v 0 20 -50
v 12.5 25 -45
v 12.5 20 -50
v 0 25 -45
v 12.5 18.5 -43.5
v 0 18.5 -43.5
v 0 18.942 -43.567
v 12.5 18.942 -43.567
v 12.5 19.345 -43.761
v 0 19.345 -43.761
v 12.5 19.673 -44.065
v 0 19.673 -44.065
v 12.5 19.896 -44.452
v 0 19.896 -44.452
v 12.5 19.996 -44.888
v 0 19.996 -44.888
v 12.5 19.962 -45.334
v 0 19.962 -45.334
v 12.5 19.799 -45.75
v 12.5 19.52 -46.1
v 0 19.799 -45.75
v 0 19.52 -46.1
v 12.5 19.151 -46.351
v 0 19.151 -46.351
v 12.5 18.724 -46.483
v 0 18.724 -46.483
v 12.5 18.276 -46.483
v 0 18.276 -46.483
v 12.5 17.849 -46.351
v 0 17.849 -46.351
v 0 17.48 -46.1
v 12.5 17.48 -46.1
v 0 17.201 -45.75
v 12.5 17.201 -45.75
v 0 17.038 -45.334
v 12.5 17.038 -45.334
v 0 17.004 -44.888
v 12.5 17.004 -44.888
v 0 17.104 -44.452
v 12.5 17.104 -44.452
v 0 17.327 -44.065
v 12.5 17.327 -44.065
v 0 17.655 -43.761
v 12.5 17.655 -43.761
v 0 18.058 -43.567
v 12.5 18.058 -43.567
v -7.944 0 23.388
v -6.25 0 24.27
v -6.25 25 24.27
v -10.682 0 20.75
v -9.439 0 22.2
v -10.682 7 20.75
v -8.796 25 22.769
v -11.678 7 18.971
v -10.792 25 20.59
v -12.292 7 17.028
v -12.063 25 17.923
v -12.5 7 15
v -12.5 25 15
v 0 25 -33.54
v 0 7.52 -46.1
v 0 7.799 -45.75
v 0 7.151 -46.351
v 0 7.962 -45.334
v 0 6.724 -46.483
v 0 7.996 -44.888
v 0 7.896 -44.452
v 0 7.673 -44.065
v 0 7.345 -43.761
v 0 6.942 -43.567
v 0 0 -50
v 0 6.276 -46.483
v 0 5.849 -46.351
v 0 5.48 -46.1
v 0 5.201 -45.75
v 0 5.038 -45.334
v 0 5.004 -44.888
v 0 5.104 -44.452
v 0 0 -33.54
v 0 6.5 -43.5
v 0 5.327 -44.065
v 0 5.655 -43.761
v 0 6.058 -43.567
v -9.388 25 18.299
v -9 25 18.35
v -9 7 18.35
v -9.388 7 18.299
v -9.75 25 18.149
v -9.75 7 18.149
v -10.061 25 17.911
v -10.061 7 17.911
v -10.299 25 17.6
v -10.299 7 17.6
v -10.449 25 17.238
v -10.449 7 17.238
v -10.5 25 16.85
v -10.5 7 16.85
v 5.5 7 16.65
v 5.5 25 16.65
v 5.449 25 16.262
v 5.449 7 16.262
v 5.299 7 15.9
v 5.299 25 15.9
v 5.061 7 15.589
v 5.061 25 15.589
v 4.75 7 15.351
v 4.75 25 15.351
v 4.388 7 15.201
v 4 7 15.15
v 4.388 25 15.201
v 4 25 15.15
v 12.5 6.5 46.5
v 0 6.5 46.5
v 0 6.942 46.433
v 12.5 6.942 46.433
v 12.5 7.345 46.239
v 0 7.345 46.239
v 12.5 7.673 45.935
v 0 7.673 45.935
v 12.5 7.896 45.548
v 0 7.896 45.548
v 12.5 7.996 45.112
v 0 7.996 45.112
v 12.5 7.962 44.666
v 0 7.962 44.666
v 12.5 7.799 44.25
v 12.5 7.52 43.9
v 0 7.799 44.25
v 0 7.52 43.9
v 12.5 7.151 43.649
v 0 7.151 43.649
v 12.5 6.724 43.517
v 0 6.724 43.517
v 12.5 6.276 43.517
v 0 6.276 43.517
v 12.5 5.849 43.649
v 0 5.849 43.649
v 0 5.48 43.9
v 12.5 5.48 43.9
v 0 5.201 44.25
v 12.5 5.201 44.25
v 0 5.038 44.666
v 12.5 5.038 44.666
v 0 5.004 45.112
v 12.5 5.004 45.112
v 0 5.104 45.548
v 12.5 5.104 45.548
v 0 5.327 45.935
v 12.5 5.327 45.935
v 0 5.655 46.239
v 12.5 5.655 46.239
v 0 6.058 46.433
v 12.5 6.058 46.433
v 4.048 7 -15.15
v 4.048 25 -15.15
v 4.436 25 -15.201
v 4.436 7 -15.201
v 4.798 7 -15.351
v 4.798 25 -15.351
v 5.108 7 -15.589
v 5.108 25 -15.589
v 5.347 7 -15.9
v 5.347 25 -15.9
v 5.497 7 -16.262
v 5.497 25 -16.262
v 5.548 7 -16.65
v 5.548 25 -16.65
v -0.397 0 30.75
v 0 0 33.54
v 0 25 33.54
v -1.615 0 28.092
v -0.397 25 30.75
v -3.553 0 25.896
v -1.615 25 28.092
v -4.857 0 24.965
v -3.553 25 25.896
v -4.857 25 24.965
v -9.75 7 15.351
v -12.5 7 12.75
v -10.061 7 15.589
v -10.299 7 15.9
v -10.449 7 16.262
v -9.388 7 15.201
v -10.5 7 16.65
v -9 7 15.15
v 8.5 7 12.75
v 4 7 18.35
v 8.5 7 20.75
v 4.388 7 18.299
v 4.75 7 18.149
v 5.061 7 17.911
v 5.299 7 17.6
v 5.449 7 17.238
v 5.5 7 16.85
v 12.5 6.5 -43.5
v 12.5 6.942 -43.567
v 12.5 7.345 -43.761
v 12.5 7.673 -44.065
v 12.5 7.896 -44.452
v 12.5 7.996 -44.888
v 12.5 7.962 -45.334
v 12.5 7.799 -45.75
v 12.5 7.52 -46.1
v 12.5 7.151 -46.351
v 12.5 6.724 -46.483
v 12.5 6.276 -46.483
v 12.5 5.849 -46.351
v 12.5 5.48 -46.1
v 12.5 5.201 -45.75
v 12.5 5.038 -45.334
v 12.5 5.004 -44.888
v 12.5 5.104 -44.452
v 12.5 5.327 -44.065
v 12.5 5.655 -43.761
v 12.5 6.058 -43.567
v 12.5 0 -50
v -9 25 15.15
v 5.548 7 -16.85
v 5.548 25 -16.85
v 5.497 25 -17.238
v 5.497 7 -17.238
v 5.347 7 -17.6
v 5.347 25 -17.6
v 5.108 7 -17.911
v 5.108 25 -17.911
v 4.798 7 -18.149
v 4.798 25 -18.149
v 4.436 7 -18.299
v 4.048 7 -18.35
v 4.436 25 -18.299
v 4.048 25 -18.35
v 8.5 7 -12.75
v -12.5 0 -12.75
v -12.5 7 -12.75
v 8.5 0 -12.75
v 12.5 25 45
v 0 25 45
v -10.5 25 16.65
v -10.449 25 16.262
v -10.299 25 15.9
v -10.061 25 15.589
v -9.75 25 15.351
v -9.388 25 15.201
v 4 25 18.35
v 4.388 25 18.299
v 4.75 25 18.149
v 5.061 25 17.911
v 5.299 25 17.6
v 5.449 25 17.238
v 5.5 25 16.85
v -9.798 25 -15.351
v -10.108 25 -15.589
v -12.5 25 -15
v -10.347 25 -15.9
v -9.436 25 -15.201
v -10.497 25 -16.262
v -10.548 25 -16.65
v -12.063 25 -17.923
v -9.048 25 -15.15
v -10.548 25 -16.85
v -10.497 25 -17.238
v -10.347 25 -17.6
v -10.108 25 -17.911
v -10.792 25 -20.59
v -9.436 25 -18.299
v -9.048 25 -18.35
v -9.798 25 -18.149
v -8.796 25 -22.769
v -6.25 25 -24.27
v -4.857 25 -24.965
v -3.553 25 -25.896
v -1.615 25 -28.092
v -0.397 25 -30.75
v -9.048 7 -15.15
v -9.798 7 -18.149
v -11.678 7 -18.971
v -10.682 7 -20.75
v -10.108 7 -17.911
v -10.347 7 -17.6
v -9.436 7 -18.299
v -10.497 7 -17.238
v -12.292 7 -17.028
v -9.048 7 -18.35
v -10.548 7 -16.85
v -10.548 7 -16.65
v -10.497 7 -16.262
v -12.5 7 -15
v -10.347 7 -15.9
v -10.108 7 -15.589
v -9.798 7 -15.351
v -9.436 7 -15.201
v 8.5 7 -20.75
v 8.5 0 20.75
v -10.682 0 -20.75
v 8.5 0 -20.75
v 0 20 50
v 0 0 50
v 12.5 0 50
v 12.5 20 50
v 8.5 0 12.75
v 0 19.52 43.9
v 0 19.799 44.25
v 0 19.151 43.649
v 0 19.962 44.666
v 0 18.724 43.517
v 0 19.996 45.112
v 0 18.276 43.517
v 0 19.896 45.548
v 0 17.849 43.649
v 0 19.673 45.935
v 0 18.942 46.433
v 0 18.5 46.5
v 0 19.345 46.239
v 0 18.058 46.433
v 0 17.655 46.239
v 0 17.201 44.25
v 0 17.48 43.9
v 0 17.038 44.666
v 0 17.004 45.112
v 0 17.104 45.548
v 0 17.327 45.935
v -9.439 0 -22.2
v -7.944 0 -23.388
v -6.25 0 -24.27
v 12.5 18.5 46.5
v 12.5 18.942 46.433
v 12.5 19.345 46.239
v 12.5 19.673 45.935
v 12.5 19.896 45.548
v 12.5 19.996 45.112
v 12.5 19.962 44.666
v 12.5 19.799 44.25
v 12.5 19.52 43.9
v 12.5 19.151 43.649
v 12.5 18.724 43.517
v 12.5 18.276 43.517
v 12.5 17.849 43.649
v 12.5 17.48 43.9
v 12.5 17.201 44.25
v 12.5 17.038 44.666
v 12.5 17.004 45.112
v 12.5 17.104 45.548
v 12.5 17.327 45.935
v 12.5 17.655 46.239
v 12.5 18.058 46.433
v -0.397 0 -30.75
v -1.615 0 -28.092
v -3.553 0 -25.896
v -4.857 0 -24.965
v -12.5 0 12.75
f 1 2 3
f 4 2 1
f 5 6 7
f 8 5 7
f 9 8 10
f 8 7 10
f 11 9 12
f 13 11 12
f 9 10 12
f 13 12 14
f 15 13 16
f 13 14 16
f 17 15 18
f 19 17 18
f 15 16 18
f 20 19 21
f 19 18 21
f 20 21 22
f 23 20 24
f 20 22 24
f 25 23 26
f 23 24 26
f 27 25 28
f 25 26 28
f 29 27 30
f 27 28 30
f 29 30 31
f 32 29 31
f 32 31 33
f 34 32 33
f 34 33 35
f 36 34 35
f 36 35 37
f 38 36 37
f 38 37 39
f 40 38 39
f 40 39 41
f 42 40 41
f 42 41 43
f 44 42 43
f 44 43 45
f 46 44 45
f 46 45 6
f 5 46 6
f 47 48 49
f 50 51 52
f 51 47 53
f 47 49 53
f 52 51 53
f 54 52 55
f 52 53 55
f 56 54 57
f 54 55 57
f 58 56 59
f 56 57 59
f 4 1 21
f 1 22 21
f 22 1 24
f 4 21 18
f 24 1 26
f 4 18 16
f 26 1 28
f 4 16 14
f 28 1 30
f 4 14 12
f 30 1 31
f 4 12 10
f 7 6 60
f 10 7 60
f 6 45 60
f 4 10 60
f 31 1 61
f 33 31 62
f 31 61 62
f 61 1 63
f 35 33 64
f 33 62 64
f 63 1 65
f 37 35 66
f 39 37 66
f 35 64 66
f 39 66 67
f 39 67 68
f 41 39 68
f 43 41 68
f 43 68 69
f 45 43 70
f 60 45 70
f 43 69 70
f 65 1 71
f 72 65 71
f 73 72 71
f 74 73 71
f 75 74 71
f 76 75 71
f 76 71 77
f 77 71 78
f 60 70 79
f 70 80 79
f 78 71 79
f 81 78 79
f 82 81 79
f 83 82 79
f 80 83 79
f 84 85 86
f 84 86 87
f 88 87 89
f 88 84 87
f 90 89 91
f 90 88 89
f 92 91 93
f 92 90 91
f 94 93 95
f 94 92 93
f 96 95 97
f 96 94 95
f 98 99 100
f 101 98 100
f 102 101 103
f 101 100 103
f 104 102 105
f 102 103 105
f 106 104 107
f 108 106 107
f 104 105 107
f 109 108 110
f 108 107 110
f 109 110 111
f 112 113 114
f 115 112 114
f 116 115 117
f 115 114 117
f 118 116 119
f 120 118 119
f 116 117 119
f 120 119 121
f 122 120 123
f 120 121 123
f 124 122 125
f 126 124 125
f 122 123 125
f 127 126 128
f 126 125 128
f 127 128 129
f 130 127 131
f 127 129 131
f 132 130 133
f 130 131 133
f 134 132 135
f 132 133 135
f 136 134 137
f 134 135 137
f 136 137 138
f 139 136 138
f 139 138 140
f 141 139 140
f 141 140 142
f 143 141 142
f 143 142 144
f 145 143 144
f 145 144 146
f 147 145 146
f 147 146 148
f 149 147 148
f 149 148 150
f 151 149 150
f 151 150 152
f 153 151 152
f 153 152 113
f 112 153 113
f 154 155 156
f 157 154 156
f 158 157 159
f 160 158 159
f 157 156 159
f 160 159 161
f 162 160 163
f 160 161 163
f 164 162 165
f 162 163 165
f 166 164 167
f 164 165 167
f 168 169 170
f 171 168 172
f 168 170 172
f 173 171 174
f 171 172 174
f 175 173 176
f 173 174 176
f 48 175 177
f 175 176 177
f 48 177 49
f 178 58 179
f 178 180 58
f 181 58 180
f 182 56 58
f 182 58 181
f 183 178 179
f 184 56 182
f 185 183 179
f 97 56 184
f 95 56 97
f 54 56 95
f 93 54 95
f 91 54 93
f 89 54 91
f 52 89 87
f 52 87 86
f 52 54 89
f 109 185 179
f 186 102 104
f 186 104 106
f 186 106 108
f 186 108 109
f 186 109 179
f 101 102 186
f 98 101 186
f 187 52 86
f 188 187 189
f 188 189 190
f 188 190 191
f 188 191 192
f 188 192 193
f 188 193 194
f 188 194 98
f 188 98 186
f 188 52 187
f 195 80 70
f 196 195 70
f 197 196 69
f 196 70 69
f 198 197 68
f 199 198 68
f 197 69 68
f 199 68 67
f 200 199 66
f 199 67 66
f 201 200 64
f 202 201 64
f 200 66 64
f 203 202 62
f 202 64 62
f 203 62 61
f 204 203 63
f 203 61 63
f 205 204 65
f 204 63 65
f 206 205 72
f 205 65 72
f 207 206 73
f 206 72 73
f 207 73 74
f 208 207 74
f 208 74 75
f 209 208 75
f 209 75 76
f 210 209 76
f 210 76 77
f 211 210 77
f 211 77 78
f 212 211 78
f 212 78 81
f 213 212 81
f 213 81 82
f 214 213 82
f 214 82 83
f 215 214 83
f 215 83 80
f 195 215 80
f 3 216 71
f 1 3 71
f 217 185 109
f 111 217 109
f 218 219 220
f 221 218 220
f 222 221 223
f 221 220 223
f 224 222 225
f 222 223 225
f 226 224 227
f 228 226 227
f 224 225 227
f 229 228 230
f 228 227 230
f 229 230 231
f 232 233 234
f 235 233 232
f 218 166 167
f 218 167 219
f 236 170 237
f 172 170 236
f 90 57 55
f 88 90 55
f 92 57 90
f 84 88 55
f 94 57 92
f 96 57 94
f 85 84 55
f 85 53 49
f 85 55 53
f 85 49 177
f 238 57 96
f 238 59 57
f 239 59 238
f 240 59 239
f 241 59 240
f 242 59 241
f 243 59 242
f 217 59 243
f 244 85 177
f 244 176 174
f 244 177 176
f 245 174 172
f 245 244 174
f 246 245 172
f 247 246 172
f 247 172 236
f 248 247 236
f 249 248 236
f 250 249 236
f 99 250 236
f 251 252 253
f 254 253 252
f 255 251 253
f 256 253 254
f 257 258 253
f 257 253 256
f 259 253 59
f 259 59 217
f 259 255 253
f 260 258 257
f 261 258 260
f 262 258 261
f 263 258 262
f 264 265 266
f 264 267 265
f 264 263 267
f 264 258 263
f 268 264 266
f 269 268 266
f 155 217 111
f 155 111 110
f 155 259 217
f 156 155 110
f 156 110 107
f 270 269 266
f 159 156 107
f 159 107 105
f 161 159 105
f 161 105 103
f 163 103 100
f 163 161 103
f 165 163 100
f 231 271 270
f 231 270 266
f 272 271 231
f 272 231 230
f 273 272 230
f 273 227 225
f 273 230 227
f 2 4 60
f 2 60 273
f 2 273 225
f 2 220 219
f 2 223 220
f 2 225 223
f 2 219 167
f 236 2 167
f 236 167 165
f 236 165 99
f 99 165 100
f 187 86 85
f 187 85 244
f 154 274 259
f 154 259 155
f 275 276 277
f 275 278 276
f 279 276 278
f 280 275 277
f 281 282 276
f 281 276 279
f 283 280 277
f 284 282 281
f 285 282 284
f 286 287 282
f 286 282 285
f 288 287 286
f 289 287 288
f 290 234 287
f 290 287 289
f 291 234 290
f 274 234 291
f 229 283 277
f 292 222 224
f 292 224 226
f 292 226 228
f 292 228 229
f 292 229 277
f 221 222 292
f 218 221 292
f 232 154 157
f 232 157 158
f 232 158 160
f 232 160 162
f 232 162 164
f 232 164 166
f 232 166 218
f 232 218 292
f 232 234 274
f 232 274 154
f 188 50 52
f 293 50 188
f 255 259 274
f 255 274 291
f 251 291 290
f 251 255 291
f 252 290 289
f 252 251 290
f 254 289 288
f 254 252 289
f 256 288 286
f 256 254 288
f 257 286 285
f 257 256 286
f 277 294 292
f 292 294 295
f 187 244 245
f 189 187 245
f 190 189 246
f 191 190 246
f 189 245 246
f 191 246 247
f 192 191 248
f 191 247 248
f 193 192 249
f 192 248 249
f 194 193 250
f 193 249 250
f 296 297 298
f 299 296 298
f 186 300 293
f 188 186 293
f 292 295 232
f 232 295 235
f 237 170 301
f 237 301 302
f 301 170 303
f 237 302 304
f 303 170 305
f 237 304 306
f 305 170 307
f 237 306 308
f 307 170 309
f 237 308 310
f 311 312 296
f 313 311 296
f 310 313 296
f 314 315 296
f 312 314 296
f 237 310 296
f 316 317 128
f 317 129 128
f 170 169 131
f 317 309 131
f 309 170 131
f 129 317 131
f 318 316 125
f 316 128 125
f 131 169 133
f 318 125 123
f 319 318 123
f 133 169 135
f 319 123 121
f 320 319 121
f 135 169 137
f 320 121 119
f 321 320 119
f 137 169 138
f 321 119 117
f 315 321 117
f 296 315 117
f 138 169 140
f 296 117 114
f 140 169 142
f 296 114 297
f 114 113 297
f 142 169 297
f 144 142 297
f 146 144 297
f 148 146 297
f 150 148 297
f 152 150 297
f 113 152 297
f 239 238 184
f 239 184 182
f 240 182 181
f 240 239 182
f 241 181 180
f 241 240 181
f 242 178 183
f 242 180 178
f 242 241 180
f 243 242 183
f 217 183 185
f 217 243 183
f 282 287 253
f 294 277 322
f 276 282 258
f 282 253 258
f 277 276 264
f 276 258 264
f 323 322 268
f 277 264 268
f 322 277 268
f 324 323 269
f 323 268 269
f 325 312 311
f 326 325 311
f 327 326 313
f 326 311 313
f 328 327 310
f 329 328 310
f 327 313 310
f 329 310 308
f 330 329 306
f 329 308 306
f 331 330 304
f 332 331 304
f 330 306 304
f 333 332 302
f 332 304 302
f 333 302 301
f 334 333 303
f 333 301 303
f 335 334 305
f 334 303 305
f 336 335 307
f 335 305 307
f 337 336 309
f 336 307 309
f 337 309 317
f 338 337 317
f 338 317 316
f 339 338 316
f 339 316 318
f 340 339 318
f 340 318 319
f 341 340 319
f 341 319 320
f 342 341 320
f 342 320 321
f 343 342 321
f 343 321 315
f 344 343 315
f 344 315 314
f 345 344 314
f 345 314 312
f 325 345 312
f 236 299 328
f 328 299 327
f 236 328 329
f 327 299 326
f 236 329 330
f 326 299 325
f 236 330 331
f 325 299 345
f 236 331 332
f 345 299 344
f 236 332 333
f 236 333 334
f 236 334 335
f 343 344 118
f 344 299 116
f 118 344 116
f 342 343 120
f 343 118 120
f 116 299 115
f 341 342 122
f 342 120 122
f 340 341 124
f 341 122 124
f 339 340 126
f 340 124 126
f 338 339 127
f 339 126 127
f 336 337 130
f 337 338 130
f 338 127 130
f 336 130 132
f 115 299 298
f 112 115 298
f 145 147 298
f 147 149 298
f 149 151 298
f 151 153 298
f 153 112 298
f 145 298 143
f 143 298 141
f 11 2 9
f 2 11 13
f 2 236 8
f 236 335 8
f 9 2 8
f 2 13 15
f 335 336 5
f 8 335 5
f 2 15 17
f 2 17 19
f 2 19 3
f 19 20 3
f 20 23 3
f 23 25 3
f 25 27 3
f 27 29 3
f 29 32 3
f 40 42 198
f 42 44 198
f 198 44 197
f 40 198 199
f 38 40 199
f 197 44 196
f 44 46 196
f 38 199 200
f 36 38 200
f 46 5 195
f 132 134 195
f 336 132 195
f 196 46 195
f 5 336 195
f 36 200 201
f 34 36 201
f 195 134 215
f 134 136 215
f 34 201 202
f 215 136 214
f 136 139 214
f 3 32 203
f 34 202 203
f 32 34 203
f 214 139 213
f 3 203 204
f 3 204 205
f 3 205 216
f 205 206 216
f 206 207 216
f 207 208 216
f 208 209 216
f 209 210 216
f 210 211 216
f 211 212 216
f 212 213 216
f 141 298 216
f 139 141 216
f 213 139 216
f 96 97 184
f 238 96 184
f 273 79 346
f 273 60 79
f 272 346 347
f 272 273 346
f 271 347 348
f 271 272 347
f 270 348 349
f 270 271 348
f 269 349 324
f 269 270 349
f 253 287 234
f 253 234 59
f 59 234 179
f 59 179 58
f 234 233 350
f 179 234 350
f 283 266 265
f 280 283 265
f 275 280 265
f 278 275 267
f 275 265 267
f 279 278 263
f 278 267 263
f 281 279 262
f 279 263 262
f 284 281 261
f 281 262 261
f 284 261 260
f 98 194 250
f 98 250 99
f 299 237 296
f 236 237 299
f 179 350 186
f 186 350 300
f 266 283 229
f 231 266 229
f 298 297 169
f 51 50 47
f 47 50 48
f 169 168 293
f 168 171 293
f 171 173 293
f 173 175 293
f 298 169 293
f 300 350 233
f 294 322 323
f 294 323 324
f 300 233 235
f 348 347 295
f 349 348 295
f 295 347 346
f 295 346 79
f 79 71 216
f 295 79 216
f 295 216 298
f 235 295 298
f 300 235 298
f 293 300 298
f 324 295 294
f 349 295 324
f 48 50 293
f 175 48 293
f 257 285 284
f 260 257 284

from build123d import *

# Parameters (mm, degrees)
SKETCH_1_W          = 16
SKETCH_1_H          = 3.2
SKETCH_1_W_2        = 16.095473014
EXTRUDE_1_DEPTH     = 25
SKETCH_2_R          = 1.5
CUT_EXTRUDE_1_DEPTH = 13.5
SKETCH_3_R          = 1.5
CUT_EXTRUDE_2_DEPTH = 13.5
FILLET_6_R          = 10
FILLET_7_R          = 1.5
CHAMFER_1_SIZE      = 5
FILLET_8_R          = 10
SKETCH1_W           = 21
SKETCH1_H           = 8
CUT_EXTRUDE1_DEPTH  = 7


with BuildPart() as part:
    # Эскиз1 → Бобышка-Вытянуть1 (new body)
    with BuildSketch(Plane(origin=(0, 0, 0), x_dir=(1, 0, 0), z_dir=(0, 1, 0))):
        Polygon((-12.5, -25), (0, -25), (0, -50), (12.5, -50), (12.5, 50), (0, 50), (0, 25), (-12.5, 25), align=None)
        with Locations((-2.5, -16.75)):
            Rectangle(SKETCH_1_W, SKETCH_1_H, mode=Mode.SUBTRACT)
        with Locations((-2.5, 16.75)):
            Rectangle(SKETCH_1_W_2, SKETCH_1_H, mode=Mode.SUBTRACT)
    extrude(amount=EXTRUDE_1_DEPTH)

    # Эскиз2 → Вырез-Вытянуть1 (cut, through all)
    with BuildSketch(Plane.ZY):
        with Locations((-45, 6.5)):
            Circle(SKETCH_2_R)
        with Locations((-45, 18.5)):
            Circle(SKETCH_2_R)
    extrude(amount=-CUT_EXTRUDE_1_DEPTH, mode=Mode.SUBTRACT)

    # Эскиз3 → Вырез-Вытянуть2 (cut, through all)
    with BuildSketch(Plane.ZY):
        with Locations((45, 6.5)):
            Circle(SKETCH_3_R)
        with Locations((45, 18.5)):
            Circle(SKETCH_3_R)
    extrude(amount=-CUT_EXTRUDE_2_DEPTH, mode=Mode.SUBTRACT)

    # Скругление6
    fillet_6_edges = [part.edges().sort_by_distance(p)[0] for p in [
        (-12.5, 12.5, 25),
        (-12.5, 12.5, -25),
    ]]
    fillet(fillet_6_edges, radius=FILLET_6_R)

    # Скругление7
    fillet_7_edges = [part.edges().sort_by_distance(p)[0] for p in [
        (-10.5, 12.5, 15.15),
        (-10.5, 12.5, 18.35),
        (5.5, 12.5, 18.35),
        (5.5, 12.5, 15.15),
        (-10.547736507, 12.5, -18.35),
        (-10.547736507, 12.5, -15.15),
        (5.547736507, 12.5, -15.15),
        (5.547736507, 12.5, -18.35),
    ]]
    fillet(fillet_7_edges, radius=FILLET_7_R)

    # Фаска1
    chamfer_1_edges = [part.edges().sort_by_distance(p)[0] for p in [
        (6.25, 25, 50),
        (6.25, 25, -50),
    ]]
    chamfer(chamfer_1_edges, length=CHAMFER_1_SIZE)

    # Скругление8
    fillet_8_edges = [part.edges().sort_by_distance(p)[0] for p in [
        (0, 12.5, 25),
        (0, 12.5, -25),
    ]]
    fillet(fillet_8_edges, radius=FILLET_8_R)

    # Sketch1 → Cut-Extrude1 (cut)
    with BuildSketch(Plane.XZ):
        with Locations((-2, 16.75)):
            Rectangle(SKETCH1_W, SKETCH1_H)
        with Locations((-2, -16.75)):
            Rectangle(SKETCH1_W, SKETCH1_H)
    extrude(amount=-CUT_EXTRUDE1_DEPTH, mode=Mode.SUBTRACT)


solid = part.part
